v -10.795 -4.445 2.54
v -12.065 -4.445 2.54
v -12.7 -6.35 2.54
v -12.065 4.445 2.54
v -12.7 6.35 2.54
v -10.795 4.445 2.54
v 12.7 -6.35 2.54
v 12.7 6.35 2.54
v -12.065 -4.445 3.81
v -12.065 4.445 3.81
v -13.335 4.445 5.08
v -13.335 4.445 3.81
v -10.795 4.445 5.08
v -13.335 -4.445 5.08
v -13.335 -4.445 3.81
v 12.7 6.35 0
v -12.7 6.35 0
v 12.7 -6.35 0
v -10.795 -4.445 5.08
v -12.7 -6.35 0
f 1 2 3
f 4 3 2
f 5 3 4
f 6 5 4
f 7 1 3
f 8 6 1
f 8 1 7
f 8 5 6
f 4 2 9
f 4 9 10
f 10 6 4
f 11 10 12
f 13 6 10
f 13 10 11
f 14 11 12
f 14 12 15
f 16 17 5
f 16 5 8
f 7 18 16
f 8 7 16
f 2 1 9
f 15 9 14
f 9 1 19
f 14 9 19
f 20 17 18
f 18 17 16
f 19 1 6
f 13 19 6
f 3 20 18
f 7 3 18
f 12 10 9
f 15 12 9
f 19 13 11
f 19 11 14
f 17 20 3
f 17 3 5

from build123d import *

# Parameters (mm, degrees)
F0_W     = 25.4
F0_H     = 12.7
F1_DEPTH = 2.54
F2_W     = 1.27
F2_H     = 8.89
F3_DEPTH = 2.54
F4_W     = 8.89
F4_H     = 1.27
F5_DEPTH = 1.27


with BuildPart() as f1:
    # F0 (on Top) → F1 (new body)
    with BuildSketch(Plane.XY):
        Rectangle(F0_W, F0_H)
    extrude(amount=F1_DEPTH)

    # F2 (on face) → F3 (join)
    with BuildSketch(Plane.XY.offset(2.54)):
        with Locations((-11.43, 0)):
            Rectangle(F2_W, F2_H)
    extrude(amount=F3_DEPTH)

    # F4 (on face) → F5 (join)
    with BuildSketch(Plane(origin=(-12.065, 0, 0), x_dir=(0, -1, 0), z_dir=(-1, 0, 0))):
        with Locations((0, 4.445)):
            Rectangle(F4_W, F4_H)
    extrude(amount=F5_DEPTH)


solid = f1.part
